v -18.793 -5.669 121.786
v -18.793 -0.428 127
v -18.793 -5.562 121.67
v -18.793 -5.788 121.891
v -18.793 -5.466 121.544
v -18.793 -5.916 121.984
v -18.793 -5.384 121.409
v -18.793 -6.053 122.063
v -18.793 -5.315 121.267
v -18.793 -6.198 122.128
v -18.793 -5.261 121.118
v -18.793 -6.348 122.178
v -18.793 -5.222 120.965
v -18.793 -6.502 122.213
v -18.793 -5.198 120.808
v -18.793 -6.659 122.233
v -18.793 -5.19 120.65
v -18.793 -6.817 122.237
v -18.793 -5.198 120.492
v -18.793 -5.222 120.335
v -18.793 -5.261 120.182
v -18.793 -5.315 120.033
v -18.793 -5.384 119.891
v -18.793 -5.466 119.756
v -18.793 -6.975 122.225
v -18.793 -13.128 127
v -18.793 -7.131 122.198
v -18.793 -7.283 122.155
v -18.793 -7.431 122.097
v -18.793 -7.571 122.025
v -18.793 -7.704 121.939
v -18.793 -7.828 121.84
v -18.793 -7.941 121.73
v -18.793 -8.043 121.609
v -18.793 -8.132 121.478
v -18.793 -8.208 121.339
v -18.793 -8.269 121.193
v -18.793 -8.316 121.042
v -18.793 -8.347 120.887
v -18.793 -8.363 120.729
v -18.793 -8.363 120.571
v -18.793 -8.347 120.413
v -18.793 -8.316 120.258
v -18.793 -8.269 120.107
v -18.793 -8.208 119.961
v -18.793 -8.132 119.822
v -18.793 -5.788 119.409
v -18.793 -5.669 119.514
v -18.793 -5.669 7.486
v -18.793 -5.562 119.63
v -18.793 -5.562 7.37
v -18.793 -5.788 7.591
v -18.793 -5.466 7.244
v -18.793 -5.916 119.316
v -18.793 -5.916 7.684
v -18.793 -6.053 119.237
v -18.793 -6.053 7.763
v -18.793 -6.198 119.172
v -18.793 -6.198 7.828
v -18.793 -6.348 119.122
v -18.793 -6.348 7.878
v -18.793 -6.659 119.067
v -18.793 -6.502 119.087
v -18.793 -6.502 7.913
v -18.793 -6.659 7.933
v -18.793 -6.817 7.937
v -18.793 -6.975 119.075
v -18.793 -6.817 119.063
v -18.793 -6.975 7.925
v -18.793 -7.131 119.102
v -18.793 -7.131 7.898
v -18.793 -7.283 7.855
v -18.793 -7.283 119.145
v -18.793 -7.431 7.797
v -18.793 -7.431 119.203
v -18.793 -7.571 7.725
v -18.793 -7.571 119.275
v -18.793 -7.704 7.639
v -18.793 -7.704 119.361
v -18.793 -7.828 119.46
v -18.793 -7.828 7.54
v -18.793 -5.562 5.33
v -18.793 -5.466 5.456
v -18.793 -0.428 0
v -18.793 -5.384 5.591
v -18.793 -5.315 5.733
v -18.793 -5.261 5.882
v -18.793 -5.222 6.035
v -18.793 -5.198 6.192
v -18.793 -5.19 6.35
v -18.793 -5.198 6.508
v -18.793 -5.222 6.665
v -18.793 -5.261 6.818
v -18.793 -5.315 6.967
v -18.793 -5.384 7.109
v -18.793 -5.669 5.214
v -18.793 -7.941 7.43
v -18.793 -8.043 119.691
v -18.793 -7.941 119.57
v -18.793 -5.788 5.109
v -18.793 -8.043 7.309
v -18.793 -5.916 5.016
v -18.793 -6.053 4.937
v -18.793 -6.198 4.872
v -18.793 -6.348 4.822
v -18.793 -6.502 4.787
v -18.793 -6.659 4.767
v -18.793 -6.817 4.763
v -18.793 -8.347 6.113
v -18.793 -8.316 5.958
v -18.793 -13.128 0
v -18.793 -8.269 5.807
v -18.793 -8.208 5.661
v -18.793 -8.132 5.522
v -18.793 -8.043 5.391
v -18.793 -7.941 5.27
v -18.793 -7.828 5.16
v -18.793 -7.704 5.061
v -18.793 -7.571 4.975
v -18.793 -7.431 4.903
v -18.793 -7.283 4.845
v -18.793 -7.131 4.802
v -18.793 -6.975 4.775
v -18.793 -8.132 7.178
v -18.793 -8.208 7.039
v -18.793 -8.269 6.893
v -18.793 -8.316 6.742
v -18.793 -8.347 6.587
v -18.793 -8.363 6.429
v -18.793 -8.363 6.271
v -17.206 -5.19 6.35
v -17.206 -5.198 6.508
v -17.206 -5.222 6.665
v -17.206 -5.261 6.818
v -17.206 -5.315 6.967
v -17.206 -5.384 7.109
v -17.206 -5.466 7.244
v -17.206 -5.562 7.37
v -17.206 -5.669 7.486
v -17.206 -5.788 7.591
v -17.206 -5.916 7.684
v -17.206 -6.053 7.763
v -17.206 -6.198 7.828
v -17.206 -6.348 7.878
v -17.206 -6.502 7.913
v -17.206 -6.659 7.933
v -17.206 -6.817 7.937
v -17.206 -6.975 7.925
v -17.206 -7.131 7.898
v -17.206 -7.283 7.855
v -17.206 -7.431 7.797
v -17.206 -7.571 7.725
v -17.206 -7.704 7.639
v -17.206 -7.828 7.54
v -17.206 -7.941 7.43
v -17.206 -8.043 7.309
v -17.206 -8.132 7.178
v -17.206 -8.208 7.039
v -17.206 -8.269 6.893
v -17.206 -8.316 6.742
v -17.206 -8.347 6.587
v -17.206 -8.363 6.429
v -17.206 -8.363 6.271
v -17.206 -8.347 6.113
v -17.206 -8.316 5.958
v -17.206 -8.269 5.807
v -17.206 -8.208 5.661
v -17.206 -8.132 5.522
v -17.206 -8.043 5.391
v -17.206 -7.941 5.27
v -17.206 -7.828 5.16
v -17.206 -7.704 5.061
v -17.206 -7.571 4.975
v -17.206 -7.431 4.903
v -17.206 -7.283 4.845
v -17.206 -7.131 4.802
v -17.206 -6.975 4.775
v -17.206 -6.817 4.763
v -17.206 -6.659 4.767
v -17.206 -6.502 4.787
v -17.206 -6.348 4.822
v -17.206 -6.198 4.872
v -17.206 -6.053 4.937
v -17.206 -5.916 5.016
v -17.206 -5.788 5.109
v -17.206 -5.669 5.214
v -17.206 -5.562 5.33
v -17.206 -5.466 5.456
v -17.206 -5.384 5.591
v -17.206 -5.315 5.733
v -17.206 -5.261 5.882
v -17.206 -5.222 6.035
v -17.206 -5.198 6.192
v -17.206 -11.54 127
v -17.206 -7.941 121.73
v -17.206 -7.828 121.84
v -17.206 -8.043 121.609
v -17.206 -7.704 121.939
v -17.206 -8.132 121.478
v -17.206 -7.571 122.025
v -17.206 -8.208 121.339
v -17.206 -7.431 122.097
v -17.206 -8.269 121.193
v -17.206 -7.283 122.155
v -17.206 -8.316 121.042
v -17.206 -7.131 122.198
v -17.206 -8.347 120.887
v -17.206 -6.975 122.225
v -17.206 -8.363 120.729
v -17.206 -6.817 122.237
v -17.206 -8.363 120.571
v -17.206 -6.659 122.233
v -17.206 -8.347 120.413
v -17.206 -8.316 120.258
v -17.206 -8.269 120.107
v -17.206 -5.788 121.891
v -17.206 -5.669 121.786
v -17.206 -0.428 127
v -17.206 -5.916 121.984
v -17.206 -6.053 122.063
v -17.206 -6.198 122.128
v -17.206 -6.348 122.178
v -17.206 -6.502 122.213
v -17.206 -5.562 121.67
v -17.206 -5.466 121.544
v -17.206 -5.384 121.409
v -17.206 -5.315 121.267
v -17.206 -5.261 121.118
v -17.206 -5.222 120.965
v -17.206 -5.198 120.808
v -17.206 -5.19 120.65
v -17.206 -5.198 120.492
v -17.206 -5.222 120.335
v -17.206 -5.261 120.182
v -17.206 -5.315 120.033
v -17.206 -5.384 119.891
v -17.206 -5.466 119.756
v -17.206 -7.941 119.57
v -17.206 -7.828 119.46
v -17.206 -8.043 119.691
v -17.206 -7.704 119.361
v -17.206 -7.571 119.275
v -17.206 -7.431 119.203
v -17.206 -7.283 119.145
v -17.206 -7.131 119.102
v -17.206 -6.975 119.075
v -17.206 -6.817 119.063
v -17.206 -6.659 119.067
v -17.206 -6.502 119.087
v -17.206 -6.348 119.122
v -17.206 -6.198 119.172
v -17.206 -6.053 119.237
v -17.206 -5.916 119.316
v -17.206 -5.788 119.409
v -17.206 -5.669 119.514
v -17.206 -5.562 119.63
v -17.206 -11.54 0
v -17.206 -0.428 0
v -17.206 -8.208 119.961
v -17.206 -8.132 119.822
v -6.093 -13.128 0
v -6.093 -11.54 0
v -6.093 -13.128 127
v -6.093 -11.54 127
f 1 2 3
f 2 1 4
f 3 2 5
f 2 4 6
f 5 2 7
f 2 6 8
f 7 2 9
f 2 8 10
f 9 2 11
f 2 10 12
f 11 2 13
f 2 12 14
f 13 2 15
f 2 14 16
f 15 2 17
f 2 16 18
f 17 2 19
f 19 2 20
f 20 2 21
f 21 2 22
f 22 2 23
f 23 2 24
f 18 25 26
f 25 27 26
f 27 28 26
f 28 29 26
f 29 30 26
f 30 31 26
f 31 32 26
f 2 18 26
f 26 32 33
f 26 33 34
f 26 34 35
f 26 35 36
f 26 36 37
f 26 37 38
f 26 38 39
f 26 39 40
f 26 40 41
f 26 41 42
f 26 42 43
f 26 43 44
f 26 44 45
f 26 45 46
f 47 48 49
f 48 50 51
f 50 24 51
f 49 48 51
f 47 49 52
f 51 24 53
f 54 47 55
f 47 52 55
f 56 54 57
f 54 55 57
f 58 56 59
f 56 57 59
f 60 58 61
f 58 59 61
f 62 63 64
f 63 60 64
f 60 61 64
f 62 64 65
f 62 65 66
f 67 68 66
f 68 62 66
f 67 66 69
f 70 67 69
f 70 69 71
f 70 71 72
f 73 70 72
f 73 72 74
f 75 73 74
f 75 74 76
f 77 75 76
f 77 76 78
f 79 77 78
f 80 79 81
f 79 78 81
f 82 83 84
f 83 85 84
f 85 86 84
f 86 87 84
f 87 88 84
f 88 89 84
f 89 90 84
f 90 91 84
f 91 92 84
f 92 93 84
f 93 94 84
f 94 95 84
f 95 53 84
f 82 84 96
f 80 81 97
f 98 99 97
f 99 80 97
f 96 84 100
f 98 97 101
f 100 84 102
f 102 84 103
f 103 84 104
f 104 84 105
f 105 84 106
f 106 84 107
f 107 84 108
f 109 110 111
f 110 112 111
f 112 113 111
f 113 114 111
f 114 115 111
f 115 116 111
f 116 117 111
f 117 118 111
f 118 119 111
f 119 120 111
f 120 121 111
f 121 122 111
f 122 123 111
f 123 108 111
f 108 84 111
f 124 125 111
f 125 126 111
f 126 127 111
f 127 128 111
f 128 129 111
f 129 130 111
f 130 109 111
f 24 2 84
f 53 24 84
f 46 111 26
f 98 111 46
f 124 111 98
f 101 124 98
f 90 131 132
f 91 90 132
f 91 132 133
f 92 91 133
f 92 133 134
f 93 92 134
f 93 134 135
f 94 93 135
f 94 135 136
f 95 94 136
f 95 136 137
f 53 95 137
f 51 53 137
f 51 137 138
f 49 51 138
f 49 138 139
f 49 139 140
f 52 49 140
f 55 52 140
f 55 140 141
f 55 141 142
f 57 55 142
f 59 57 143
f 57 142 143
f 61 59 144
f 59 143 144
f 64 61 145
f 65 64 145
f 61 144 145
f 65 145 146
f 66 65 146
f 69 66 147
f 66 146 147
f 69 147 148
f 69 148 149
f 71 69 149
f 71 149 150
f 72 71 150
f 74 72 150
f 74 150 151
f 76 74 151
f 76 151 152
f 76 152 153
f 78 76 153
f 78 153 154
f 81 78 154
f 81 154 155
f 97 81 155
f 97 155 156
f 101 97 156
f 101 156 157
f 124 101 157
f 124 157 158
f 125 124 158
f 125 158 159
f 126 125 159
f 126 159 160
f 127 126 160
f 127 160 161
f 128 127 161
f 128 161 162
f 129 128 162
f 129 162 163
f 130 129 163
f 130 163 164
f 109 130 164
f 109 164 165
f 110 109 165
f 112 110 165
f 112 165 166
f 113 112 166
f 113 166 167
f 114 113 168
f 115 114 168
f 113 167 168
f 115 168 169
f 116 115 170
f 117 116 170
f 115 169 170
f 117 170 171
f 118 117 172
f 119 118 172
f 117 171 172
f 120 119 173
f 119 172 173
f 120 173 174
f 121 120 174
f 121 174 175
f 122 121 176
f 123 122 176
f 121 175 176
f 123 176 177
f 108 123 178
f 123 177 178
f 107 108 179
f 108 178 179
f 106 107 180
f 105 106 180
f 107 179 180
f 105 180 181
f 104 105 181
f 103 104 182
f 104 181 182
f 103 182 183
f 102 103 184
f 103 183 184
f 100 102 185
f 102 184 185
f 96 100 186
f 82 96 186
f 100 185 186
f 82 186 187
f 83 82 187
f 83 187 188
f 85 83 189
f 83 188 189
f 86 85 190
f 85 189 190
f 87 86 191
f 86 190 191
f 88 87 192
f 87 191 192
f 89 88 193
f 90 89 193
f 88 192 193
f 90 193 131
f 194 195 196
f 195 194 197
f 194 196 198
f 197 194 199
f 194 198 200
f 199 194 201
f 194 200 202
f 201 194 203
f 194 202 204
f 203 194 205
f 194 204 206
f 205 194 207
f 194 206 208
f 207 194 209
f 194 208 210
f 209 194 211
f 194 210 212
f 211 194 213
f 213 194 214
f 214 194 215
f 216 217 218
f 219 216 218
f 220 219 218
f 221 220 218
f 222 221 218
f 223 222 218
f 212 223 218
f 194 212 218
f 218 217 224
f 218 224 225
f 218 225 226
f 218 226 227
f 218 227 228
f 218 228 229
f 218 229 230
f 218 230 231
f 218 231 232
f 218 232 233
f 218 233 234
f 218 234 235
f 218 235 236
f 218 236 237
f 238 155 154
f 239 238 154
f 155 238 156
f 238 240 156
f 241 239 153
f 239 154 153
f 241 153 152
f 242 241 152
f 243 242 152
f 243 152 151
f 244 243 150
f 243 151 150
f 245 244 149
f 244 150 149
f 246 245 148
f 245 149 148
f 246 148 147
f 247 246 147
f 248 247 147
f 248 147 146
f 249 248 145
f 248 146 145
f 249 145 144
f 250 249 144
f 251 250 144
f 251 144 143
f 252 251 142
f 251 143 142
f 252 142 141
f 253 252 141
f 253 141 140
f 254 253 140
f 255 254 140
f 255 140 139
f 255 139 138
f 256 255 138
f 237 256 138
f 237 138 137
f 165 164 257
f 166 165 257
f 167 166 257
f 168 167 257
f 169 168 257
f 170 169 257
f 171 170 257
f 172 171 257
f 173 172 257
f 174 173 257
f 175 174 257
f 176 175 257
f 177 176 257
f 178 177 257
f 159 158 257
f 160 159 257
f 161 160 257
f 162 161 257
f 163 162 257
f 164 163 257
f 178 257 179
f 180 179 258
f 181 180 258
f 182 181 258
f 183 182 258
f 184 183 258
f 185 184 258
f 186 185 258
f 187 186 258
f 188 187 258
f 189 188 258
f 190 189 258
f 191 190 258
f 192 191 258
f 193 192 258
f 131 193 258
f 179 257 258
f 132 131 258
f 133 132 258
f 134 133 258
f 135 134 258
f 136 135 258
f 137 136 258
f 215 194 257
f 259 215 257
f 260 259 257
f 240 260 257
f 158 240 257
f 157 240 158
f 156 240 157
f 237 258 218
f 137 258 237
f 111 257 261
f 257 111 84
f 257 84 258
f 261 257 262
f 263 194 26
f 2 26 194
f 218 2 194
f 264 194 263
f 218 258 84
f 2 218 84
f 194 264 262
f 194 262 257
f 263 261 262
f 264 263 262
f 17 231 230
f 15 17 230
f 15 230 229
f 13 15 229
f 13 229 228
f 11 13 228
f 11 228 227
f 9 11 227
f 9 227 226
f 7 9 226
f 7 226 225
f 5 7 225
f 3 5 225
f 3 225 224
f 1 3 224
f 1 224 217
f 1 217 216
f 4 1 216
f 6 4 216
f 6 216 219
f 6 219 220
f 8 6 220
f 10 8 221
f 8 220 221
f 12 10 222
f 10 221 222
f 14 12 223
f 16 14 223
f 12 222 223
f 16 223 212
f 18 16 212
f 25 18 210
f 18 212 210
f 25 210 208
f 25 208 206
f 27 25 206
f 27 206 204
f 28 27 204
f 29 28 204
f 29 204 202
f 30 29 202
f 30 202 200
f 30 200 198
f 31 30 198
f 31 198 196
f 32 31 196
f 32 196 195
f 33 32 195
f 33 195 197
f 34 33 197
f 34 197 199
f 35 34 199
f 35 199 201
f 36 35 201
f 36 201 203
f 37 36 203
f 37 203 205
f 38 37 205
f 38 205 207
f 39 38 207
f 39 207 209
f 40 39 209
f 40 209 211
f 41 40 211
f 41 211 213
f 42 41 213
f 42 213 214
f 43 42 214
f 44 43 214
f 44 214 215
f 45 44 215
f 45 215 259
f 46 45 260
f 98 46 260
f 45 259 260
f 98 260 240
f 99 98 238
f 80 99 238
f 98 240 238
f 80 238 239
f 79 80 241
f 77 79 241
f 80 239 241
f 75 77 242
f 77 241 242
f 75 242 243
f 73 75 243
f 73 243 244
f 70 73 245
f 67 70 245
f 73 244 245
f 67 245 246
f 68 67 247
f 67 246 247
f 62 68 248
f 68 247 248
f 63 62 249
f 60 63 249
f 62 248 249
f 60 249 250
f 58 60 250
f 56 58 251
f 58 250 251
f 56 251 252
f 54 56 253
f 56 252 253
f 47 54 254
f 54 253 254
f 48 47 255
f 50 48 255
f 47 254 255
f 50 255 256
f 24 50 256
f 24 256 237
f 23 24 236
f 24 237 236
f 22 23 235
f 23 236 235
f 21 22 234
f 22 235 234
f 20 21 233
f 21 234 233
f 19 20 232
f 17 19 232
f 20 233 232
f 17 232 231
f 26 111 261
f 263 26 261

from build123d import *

# Parameters (mm, degrees)
F1_DEPTH = 127
F3_R     = 1.5875
F4_DEPTH = 25.4


with BuildPart() as f1:
    # F0 (on Top) → F1 (new body)
    with BuildSketch(Plane.XY):
        Polygon((-17.205867, -0.427721), (-18.793367, -0.427721), (-18.793367, -13.127721), (-6.093367, -13.127721), (-6.093367, -11.540221), (-17.205867, -11.540221), align=None)
    extrude(amount=F1_DEPTH)

    # F3 (on face) → F4 (cut)
    with BuildSketch(Plane.YZ.offset(-17.205867)):
        with Locations((-6.777721, 6.35)):
            Circle(F3_R)
        with Locations((-6.777721, 120.65)):
            Circle(F3_R)
    extrude(amount=-F4_DEPTH, mode=Mode.SUBTRACT)


solid = f1.part
